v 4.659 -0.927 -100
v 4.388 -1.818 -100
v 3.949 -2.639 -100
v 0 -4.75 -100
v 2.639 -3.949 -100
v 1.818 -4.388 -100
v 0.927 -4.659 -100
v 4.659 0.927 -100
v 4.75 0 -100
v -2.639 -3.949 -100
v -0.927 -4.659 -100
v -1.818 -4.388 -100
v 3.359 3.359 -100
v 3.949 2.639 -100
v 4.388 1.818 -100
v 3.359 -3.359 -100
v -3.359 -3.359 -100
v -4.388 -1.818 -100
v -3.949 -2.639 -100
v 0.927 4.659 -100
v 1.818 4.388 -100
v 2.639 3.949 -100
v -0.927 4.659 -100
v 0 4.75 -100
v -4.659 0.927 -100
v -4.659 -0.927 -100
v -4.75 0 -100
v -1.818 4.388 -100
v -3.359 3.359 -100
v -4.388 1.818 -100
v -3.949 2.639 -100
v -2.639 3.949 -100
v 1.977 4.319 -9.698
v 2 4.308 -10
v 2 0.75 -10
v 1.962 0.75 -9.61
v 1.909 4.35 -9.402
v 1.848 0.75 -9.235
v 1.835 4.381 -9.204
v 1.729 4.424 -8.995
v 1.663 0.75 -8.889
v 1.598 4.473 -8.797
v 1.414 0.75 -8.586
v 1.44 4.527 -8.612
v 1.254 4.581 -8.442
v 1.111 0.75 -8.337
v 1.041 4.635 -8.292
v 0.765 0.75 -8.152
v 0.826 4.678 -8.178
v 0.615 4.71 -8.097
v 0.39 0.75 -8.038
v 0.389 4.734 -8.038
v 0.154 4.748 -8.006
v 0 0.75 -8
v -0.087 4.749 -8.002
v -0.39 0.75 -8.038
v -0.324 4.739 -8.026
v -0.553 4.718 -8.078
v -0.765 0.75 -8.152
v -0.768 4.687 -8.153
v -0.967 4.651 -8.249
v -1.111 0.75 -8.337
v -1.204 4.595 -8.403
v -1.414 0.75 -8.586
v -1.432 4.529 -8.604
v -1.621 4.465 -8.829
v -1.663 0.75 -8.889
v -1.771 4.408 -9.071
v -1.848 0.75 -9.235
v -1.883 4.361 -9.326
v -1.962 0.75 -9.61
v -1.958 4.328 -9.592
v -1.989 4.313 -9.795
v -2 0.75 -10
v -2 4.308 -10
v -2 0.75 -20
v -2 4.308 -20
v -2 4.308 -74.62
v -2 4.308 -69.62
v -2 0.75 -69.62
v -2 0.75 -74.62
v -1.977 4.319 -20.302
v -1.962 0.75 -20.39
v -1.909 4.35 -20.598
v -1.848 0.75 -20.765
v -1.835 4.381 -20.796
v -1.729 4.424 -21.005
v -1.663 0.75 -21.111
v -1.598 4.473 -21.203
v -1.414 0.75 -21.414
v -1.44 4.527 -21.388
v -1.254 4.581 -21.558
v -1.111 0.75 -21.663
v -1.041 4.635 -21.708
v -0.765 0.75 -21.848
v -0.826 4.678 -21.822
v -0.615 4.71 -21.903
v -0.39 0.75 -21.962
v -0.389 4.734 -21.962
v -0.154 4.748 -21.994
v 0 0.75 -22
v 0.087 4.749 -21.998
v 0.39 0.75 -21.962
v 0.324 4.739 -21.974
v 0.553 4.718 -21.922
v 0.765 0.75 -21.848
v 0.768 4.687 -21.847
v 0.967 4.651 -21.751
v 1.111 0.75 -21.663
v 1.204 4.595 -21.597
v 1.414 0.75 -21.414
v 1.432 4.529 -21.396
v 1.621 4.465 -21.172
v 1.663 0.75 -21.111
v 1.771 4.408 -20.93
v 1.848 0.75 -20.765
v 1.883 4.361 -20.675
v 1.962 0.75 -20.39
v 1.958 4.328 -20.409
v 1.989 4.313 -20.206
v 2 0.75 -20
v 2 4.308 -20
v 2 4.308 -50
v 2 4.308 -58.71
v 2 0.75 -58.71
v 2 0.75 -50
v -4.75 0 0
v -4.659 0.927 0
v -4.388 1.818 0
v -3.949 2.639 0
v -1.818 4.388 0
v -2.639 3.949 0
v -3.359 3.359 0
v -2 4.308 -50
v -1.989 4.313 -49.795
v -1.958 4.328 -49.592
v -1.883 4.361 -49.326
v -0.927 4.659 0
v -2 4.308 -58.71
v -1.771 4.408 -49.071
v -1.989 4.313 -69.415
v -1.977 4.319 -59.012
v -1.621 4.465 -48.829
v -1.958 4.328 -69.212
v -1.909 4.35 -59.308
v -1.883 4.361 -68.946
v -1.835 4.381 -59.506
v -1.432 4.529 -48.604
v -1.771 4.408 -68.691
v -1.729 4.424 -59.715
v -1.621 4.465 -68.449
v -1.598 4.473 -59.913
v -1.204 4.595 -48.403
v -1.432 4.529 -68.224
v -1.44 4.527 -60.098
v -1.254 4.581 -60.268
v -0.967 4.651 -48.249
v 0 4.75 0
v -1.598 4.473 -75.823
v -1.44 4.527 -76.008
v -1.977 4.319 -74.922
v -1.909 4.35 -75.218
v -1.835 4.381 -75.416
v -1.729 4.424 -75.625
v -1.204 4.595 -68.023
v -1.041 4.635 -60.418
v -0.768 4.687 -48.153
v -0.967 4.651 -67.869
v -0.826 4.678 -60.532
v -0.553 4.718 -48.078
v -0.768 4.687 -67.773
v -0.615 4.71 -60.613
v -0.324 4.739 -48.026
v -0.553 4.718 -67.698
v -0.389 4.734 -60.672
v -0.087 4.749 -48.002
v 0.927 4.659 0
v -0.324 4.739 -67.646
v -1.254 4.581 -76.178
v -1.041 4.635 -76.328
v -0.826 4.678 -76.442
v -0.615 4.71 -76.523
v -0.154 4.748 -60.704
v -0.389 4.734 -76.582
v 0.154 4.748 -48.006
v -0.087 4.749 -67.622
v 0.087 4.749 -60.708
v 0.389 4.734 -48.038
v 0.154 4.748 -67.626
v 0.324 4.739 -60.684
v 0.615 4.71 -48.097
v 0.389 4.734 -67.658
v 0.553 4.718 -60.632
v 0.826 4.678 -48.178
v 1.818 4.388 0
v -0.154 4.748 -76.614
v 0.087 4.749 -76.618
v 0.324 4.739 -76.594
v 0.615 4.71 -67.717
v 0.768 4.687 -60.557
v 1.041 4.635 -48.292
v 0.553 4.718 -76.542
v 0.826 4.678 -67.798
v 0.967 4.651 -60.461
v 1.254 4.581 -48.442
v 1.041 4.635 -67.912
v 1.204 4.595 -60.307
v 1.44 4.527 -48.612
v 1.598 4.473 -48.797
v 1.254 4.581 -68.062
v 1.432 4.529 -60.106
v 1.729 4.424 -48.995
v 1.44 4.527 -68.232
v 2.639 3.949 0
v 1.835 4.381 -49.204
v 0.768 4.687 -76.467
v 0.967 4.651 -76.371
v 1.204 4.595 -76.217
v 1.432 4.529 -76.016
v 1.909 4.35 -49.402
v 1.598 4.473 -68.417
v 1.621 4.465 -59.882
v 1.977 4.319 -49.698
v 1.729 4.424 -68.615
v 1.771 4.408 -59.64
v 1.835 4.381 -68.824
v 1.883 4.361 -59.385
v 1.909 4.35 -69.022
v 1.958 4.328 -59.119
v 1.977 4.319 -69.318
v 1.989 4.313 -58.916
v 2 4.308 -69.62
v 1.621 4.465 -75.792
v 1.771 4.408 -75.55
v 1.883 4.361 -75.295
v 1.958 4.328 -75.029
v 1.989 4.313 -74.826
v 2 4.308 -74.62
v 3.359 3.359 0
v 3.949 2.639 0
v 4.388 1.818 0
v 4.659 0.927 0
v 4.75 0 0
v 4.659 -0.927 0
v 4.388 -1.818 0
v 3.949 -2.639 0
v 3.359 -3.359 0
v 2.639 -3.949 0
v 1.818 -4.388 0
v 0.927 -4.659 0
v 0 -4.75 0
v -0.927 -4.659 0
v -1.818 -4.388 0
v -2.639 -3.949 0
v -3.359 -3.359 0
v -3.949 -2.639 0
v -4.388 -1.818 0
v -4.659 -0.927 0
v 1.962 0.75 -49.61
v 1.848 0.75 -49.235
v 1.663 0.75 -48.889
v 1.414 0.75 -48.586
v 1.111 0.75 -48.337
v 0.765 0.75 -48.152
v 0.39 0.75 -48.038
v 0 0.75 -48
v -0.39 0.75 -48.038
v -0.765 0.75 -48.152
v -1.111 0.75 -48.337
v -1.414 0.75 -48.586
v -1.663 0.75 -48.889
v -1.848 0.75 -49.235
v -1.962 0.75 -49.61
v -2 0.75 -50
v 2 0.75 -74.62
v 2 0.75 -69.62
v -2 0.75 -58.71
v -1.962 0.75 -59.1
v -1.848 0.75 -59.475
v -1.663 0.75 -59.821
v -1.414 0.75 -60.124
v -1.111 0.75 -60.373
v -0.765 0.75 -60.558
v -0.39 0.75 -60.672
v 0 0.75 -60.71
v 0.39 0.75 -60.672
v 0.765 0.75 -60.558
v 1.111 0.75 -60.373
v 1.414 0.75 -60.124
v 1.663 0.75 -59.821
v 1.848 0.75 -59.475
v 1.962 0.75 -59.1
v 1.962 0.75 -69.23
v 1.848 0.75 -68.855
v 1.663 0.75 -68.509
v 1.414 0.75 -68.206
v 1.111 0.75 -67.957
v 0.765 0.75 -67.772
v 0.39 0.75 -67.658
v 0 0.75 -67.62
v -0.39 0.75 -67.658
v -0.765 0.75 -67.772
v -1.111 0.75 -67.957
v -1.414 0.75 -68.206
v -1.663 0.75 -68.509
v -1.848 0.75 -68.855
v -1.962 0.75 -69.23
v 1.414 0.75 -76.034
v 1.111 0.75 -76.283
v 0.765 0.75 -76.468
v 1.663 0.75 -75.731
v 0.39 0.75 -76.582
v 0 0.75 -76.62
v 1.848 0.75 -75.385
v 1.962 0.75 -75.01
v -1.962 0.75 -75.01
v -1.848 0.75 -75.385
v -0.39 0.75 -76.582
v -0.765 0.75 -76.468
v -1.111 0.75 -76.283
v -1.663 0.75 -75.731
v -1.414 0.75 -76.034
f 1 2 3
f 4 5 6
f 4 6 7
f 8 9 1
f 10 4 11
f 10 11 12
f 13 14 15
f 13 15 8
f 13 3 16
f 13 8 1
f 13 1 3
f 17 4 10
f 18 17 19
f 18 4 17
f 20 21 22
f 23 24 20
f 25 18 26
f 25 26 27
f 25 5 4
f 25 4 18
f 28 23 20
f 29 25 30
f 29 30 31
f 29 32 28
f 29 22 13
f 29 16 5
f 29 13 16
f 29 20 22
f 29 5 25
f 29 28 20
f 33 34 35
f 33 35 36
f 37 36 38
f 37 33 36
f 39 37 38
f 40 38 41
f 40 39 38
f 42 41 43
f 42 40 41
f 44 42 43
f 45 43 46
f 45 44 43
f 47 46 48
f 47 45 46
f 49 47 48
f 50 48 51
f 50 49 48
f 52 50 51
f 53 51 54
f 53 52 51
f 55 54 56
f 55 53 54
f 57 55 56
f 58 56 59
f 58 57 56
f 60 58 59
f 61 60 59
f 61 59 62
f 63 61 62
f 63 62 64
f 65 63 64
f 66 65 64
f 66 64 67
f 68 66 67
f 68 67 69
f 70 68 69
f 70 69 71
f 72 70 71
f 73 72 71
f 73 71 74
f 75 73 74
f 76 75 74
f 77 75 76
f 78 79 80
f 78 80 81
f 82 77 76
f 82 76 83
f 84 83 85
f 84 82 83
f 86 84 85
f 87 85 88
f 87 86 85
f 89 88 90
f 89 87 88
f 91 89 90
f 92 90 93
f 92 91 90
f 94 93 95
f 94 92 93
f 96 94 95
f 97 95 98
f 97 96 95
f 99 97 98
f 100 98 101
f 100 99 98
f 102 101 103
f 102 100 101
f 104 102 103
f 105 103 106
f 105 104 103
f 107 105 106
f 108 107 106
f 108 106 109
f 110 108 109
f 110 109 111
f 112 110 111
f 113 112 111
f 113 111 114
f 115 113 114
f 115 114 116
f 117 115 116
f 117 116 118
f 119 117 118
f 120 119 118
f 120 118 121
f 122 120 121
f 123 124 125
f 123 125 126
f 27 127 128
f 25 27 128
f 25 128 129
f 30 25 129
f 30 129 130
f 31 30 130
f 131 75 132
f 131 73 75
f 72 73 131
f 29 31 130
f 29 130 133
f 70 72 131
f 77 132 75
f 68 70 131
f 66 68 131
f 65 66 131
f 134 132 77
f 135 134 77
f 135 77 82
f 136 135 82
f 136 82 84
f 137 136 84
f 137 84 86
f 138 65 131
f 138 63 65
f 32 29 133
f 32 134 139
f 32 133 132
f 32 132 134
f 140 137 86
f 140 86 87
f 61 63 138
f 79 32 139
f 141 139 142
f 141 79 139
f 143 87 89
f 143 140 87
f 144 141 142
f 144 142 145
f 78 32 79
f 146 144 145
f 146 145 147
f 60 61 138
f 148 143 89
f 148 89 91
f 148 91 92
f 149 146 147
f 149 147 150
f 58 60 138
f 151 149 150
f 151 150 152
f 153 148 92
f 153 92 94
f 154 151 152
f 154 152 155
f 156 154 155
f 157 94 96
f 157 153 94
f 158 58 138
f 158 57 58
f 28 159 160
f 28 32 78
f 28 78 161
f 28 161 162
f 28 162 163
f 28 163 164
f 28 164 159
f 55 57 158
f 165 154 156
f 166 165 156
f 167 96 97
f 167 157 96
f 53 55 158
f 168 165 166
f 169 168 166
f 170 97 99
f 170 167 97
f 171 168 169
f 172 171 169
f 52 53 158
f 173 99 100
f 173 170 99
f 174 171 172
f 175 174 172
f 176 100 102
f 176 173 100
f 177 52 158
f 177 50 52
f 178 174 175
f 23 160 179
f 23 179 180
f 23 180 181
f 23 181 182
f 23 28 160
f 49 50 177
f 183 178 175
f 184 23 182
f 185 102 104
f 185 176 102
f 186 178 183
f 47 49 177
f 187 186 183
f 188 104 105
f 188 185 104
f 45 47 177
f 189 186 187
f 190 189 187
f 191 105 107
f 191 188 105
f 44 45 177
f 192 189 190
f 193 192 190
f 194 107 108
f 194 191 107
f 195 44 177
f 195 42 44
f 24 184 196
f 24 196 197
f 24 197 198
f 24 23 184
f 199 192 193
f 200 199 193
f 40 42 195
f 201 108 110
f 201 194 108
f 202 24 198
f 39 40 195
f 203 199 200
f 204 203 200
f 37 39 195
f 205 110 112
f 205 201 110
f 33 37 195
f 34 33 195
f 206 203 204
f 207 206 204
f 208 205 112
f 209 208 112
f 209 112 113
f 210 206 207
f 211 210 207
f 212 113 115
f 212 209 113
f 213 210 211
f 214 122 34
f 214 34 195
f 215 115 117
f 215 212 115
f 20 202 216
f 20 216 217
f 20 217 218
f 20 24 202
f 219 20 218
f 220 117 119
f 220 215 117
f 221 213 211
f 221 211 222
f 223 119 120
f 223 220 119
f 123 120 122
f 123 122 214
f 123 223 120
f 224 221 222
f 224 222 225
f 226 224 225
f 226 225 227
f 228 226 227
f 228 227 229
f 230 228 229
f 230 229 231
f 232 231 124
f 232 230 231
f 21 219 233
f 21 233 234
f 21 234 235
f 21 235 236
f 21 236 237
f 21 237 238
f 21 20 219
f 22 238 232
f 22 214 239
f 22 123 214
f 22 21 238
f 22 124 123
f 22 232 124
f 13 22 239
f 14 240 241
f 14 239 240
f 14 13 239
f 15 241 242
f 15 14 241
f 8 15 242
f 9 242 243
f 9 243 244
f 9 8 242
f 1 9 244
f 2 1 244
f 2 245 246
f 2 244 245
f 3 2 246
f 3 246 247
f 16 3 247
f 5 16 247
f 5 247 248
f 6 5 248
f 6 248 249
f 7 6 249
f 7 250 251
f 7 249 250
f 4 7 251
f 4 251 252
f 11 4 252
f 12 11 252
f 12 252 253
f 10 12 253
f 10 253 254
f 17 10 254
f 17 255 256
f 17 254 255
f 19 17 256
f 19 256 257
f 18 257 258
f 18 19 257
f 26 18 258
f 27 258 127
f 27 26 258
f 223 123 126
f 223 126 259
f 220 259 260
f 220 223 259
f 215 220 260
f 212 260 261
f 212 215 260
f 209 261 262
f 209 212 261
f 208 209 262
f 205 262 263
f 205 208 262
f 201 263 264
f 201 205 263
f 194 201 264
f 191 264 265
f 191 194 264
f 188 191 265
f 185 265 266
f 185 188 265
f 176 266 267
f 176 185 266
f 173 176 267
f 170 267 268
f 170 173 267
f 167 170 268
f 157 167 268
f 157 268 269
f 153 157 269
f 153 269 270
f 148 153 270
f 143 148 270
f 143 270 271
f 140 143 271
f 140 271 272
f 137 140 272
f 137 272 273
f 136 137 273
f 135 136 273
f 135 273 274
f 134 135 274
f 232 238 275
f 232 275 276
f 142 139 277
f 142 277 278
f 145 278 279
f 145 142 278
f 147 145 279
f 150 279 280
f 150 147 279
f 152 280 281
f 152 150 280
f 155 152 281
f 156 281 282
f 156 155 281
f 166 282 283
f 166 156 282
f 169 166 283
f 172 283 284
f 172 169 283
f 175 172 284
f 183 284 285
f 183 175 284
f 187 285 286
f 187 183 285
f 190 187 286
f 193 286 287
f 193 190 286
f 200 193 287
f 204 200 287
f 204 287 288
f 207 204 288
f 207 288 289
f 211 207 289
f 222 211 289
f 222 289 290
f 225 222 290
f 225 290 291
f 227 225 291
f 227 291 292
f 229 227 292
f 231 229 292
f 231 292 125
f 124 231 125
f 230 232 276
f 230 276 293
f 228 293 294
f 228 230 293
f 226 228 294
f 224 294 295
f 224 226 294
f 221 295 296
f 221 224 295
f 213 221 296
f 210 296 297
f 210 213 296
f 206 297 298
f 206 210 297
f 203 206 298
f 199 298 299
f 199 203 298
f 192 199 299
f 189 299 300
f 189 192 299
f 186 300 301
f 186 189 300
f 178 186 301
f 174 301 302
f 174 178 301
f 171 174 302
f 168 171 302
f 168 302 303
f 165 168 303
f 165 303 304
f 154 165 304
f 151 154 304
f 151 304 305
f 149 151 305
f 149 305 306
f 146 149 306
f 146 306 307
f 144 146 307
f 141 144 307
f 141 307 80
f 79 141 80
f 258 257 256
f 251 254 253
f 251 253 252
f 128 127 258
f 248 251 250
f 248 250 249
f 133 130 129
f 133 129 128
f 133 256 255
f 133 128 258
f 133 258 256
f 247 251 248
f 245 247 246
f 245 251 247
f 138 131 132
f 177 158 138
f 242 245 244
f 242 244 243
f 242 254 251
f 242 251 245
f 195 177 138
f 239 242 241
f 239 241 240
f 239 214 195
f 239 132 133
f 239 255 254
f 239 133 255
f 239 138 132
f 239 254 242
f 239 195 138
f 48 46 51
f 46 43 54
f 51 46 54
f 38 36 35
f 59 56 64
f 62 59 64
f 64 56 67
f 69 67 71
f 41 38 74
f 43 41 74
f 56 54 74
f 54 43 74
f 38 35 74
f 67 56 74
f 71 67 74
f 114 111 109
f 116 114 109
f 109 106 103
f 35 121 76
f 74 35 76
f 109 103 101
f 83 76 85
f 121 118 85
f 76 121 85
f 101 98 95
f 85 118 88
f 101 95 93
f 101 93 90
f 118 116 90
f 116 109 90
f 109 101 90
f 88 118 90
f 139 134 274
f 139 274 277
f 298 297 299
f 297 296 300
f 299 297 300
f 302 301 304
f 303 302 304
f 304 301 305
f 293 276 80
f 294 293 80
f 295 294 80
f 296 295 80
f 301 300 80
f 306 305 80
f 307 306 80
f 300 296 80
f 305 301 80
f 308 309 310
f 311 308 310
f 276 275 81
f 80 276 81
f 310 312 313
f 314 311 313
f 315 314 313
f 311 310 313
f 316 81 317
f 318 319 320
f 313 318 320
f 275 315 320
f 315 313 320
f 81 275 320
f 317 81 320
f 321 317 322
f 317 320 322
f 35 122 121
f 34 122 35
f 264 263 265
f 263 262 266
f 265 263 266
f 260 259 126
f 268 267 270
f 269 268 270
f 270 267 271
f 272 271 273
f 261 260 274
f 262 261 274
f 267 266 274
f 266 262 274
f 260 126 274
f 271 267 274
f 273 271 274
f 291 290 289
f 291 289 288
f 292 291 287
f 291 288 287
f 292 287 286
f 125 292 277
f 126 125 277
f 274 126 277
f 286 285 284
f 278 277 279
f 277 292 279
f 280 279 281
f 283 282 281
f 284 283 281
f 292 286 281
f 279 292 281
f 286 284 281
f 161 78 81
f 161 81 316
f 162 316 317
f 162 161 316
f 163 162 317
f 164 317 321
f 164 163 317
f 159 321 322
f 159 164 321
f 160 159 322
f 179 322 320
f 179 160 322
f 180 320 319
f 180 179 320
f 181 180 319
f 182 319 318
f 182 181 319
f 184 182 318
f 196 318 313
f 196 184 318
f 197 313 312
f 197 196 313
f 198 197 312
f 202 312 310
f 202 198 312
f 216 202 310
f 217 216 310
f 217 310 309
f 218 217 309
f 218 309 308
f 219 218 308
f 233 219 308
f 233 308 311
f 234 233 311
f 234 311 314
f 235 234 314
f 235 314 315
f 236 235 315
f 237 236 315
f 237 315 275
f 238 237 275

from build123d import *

# Parameters (mm, degrees)
SKETCH1_R           = 4.75
BOSS_EXTRUDE1_DEPTH = 0.0001
BOSS_EXTRUDE2_START = 105
SKETCH4_R           = 4.75
BOSS_EXTRUDE2_DEPTH = 105
CUT_EXTRUDE3_DEPTH  = 4
SKETCH6_R           = 4.75
CUT_EXTRUDE4_DEPTH  = 5


with BuildPart() as part:
    # Sketch1 → Boss-Extrude1 (new body)
    with BuildSketch(Plane.XY):
        Circle(SKETCH1_R)
    extrude(amount=BOSS_EXTRUDE1_DEPTH)

    # Sketch4 → Boss-Extrude2 (add)
    with BuildSketch(Plane(origin=(0, 0, 0), x_dir=(-1, 0, 0), z_dir=(0, 0, -1)).offset(BOSS_EXTRUDE2_START)):
        Circle(SKETCH4_R)
    extrude(amount=-BOSS_EXTRUDE2_DEPTH)

    # Sketch5 → Cut-Extrude3 (cut)
    with BuildSketch(Plane(origin=(0, 4.75, 0), x_dir=(1, 0, 0), z_dir=(0, 1, 0))):
        with BuildLine():
            Line((-2, 10), (-2, 20))
            ThreePointArc((-2, 20), (0, 22), (2, 20))
            Line((2, 20), (2, 10))
            ThreePointArc((2, 10), (0, 8), (-2, 10))
        make_face()
        with BuildLine():
            Line((-2, 50), (-2, 58.71))
            ThreePointArc((-2, 58.71), (0, 60.71), (2, 58.71))
            Line((2, 58.71), (2, 50))
            ThreePointArc((2, 50), (0, 48), (-2, 50))
        make_face()
        with BuildLine():
            Line((-2, 69.62), (-2, 74.62))
            ThreePointArc((-2, 74.62), (0, 76.62), (2, 74.62))
            Line((2, 74.62), (2, 69.62))
            ThreePointArc((2, 69.62), (0, 67.62), (-2, 69.62))
        make_face()
    extrude(amount=-CUT_EXTRUDE3_DEPTH, mode=Mode.SUBTRACT)

    # Sketch6 → Cut-Extrude4 (cut)
    with BuildSketch(Plane(origin=(0, 0, -105), x_dir=(-1, 0, 0), z_dir=(0, 0, -1))):
        Circle(SKETCH6_R)
    extrude(amount=-CUT_EXTRUDE4_DEPTH, mode=Mode.SUBTRACT)


solid = part.part
